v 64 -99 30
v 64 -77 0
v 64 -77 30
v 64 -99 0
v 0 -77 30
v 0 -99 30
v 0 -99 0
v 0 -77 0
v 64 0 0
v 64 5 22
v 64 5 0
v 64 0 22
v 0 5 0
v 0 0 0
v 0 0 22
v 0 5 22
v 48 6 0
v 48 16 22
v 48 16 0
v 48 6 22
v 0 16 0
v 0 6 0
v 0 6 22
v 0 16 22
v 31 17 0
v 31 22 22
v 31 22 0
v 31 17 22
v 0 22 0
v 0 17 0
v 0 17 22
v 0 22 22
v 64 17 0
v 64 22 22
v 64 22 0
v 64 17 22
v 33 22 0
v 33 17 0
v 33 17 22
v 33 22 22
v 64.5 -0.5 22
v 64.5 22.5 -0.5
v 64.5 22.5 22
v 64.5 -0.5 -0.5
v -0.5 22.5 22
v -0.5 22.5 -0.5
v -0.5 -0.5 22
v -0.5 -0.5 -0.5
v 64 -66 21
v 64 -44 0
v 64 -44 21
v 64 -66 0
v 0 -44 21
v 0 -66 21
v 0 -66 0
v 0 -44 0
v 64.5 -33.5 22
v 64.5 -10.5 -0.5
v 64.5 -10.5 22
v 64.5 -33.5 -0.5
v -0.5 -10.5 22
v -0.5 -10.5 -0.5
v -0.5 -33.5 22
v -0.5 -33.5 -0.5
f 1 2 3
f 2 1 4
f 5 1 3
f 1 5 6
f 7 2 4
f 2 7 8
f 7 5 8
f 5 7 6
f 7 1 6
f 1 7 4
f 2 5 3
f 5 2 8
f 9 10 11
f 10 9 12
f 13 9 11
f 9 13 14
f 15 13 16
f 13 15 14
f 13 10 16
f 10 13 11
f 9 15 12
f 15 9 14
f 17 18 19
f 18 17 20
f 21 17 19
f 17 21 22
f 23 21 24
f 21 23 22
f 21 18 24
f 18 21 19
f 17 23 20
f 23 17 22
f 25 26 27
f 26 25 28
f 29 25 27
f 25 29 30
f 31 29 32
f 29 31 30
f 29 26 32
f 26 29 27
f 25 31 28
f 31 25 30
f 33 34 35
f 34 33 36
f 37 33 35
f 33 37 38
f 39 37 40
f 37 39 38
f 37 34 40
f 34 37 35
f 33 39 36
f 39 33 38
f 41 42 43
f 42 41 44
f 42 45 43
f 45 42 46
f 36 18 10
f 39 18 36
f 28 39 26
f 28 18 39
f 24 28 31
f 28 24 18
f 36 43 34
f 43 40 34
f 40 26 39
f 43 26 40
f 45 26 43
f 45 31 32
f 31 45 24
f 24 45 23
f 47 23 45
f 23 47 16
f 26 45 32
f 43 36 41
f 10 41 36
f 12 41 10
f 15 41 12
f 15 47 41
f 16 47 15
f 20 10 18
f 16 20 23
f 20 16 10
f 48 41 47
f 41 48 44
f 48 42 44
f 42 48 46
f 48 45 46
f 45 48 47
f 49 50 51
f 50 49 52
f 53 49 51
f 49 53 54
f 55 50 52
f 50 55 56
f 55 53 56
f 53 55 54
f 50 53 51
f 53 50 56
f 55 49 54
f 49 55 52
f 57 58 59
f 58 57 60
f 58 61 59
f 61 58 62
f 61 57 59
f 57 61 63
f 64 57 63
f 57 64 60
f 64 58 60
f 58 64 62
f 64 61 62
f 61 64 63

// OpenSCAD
// file: 00_vars.scad
size_x = 64;
size_y = 22; 
size_z = 30;
size_wall = 1;

top_part = 0.3;
bot_part = 1 - top_part;
top_overlay = 0.6;

offset = 0.2;   // TODO rename
cutted_top_second_shell = true;

locker_x = 10;
locker_r = 0.6;
locker_coff = 1.15;


module 00_initial_forms() {
translate([0,0,0]) 
cube([64,5,30]);

translate([0,6,0])
cube([48,10,30]);

translate([0,17,0])
cube([31,5,30]);

translate([31 + 2,17,0])
cube([31,5,30]);
}

module 00_min_vol() {
    cube([size_x,size_y,size_z]);
}

//00_initial_forms(); #00_min_vol();
// main file
include <00_vars.scad>;


module internal_core_wall() {
    scale([1,1,bot_part])
    00_min_vol();
}

module min_vol_n_half_wall() {
    minkowski() {
        union() {
            internal_core_wall();
            translate([0,0,size_wall/2])
            internal_core_wall();
        }
        cube(size_wall, center = true);
    }
}

module 01_internal_walls() {
    difference() {
        min_vol_n_half_wall();
        00_initial_forms();
    }
}


steps = 3;  // decrease step number for better understanding

translate([0, - (steps - 0) * (size_y * 1.5), 0]) {
    00_initial_forms();
    #00_min_vol();
}

translate([0, - (steps - 1) * (size_y * 1.5), 0]) {
    internal_core_wall();
}

translate([0, - (steps - 2) * (size_y * 1.5), 0]) {
    min_vol_n_half_wall();
}

translate([0, - (steps - 3) * (size_y * 1.5), 0]) {
    01_internal_walls();
}
